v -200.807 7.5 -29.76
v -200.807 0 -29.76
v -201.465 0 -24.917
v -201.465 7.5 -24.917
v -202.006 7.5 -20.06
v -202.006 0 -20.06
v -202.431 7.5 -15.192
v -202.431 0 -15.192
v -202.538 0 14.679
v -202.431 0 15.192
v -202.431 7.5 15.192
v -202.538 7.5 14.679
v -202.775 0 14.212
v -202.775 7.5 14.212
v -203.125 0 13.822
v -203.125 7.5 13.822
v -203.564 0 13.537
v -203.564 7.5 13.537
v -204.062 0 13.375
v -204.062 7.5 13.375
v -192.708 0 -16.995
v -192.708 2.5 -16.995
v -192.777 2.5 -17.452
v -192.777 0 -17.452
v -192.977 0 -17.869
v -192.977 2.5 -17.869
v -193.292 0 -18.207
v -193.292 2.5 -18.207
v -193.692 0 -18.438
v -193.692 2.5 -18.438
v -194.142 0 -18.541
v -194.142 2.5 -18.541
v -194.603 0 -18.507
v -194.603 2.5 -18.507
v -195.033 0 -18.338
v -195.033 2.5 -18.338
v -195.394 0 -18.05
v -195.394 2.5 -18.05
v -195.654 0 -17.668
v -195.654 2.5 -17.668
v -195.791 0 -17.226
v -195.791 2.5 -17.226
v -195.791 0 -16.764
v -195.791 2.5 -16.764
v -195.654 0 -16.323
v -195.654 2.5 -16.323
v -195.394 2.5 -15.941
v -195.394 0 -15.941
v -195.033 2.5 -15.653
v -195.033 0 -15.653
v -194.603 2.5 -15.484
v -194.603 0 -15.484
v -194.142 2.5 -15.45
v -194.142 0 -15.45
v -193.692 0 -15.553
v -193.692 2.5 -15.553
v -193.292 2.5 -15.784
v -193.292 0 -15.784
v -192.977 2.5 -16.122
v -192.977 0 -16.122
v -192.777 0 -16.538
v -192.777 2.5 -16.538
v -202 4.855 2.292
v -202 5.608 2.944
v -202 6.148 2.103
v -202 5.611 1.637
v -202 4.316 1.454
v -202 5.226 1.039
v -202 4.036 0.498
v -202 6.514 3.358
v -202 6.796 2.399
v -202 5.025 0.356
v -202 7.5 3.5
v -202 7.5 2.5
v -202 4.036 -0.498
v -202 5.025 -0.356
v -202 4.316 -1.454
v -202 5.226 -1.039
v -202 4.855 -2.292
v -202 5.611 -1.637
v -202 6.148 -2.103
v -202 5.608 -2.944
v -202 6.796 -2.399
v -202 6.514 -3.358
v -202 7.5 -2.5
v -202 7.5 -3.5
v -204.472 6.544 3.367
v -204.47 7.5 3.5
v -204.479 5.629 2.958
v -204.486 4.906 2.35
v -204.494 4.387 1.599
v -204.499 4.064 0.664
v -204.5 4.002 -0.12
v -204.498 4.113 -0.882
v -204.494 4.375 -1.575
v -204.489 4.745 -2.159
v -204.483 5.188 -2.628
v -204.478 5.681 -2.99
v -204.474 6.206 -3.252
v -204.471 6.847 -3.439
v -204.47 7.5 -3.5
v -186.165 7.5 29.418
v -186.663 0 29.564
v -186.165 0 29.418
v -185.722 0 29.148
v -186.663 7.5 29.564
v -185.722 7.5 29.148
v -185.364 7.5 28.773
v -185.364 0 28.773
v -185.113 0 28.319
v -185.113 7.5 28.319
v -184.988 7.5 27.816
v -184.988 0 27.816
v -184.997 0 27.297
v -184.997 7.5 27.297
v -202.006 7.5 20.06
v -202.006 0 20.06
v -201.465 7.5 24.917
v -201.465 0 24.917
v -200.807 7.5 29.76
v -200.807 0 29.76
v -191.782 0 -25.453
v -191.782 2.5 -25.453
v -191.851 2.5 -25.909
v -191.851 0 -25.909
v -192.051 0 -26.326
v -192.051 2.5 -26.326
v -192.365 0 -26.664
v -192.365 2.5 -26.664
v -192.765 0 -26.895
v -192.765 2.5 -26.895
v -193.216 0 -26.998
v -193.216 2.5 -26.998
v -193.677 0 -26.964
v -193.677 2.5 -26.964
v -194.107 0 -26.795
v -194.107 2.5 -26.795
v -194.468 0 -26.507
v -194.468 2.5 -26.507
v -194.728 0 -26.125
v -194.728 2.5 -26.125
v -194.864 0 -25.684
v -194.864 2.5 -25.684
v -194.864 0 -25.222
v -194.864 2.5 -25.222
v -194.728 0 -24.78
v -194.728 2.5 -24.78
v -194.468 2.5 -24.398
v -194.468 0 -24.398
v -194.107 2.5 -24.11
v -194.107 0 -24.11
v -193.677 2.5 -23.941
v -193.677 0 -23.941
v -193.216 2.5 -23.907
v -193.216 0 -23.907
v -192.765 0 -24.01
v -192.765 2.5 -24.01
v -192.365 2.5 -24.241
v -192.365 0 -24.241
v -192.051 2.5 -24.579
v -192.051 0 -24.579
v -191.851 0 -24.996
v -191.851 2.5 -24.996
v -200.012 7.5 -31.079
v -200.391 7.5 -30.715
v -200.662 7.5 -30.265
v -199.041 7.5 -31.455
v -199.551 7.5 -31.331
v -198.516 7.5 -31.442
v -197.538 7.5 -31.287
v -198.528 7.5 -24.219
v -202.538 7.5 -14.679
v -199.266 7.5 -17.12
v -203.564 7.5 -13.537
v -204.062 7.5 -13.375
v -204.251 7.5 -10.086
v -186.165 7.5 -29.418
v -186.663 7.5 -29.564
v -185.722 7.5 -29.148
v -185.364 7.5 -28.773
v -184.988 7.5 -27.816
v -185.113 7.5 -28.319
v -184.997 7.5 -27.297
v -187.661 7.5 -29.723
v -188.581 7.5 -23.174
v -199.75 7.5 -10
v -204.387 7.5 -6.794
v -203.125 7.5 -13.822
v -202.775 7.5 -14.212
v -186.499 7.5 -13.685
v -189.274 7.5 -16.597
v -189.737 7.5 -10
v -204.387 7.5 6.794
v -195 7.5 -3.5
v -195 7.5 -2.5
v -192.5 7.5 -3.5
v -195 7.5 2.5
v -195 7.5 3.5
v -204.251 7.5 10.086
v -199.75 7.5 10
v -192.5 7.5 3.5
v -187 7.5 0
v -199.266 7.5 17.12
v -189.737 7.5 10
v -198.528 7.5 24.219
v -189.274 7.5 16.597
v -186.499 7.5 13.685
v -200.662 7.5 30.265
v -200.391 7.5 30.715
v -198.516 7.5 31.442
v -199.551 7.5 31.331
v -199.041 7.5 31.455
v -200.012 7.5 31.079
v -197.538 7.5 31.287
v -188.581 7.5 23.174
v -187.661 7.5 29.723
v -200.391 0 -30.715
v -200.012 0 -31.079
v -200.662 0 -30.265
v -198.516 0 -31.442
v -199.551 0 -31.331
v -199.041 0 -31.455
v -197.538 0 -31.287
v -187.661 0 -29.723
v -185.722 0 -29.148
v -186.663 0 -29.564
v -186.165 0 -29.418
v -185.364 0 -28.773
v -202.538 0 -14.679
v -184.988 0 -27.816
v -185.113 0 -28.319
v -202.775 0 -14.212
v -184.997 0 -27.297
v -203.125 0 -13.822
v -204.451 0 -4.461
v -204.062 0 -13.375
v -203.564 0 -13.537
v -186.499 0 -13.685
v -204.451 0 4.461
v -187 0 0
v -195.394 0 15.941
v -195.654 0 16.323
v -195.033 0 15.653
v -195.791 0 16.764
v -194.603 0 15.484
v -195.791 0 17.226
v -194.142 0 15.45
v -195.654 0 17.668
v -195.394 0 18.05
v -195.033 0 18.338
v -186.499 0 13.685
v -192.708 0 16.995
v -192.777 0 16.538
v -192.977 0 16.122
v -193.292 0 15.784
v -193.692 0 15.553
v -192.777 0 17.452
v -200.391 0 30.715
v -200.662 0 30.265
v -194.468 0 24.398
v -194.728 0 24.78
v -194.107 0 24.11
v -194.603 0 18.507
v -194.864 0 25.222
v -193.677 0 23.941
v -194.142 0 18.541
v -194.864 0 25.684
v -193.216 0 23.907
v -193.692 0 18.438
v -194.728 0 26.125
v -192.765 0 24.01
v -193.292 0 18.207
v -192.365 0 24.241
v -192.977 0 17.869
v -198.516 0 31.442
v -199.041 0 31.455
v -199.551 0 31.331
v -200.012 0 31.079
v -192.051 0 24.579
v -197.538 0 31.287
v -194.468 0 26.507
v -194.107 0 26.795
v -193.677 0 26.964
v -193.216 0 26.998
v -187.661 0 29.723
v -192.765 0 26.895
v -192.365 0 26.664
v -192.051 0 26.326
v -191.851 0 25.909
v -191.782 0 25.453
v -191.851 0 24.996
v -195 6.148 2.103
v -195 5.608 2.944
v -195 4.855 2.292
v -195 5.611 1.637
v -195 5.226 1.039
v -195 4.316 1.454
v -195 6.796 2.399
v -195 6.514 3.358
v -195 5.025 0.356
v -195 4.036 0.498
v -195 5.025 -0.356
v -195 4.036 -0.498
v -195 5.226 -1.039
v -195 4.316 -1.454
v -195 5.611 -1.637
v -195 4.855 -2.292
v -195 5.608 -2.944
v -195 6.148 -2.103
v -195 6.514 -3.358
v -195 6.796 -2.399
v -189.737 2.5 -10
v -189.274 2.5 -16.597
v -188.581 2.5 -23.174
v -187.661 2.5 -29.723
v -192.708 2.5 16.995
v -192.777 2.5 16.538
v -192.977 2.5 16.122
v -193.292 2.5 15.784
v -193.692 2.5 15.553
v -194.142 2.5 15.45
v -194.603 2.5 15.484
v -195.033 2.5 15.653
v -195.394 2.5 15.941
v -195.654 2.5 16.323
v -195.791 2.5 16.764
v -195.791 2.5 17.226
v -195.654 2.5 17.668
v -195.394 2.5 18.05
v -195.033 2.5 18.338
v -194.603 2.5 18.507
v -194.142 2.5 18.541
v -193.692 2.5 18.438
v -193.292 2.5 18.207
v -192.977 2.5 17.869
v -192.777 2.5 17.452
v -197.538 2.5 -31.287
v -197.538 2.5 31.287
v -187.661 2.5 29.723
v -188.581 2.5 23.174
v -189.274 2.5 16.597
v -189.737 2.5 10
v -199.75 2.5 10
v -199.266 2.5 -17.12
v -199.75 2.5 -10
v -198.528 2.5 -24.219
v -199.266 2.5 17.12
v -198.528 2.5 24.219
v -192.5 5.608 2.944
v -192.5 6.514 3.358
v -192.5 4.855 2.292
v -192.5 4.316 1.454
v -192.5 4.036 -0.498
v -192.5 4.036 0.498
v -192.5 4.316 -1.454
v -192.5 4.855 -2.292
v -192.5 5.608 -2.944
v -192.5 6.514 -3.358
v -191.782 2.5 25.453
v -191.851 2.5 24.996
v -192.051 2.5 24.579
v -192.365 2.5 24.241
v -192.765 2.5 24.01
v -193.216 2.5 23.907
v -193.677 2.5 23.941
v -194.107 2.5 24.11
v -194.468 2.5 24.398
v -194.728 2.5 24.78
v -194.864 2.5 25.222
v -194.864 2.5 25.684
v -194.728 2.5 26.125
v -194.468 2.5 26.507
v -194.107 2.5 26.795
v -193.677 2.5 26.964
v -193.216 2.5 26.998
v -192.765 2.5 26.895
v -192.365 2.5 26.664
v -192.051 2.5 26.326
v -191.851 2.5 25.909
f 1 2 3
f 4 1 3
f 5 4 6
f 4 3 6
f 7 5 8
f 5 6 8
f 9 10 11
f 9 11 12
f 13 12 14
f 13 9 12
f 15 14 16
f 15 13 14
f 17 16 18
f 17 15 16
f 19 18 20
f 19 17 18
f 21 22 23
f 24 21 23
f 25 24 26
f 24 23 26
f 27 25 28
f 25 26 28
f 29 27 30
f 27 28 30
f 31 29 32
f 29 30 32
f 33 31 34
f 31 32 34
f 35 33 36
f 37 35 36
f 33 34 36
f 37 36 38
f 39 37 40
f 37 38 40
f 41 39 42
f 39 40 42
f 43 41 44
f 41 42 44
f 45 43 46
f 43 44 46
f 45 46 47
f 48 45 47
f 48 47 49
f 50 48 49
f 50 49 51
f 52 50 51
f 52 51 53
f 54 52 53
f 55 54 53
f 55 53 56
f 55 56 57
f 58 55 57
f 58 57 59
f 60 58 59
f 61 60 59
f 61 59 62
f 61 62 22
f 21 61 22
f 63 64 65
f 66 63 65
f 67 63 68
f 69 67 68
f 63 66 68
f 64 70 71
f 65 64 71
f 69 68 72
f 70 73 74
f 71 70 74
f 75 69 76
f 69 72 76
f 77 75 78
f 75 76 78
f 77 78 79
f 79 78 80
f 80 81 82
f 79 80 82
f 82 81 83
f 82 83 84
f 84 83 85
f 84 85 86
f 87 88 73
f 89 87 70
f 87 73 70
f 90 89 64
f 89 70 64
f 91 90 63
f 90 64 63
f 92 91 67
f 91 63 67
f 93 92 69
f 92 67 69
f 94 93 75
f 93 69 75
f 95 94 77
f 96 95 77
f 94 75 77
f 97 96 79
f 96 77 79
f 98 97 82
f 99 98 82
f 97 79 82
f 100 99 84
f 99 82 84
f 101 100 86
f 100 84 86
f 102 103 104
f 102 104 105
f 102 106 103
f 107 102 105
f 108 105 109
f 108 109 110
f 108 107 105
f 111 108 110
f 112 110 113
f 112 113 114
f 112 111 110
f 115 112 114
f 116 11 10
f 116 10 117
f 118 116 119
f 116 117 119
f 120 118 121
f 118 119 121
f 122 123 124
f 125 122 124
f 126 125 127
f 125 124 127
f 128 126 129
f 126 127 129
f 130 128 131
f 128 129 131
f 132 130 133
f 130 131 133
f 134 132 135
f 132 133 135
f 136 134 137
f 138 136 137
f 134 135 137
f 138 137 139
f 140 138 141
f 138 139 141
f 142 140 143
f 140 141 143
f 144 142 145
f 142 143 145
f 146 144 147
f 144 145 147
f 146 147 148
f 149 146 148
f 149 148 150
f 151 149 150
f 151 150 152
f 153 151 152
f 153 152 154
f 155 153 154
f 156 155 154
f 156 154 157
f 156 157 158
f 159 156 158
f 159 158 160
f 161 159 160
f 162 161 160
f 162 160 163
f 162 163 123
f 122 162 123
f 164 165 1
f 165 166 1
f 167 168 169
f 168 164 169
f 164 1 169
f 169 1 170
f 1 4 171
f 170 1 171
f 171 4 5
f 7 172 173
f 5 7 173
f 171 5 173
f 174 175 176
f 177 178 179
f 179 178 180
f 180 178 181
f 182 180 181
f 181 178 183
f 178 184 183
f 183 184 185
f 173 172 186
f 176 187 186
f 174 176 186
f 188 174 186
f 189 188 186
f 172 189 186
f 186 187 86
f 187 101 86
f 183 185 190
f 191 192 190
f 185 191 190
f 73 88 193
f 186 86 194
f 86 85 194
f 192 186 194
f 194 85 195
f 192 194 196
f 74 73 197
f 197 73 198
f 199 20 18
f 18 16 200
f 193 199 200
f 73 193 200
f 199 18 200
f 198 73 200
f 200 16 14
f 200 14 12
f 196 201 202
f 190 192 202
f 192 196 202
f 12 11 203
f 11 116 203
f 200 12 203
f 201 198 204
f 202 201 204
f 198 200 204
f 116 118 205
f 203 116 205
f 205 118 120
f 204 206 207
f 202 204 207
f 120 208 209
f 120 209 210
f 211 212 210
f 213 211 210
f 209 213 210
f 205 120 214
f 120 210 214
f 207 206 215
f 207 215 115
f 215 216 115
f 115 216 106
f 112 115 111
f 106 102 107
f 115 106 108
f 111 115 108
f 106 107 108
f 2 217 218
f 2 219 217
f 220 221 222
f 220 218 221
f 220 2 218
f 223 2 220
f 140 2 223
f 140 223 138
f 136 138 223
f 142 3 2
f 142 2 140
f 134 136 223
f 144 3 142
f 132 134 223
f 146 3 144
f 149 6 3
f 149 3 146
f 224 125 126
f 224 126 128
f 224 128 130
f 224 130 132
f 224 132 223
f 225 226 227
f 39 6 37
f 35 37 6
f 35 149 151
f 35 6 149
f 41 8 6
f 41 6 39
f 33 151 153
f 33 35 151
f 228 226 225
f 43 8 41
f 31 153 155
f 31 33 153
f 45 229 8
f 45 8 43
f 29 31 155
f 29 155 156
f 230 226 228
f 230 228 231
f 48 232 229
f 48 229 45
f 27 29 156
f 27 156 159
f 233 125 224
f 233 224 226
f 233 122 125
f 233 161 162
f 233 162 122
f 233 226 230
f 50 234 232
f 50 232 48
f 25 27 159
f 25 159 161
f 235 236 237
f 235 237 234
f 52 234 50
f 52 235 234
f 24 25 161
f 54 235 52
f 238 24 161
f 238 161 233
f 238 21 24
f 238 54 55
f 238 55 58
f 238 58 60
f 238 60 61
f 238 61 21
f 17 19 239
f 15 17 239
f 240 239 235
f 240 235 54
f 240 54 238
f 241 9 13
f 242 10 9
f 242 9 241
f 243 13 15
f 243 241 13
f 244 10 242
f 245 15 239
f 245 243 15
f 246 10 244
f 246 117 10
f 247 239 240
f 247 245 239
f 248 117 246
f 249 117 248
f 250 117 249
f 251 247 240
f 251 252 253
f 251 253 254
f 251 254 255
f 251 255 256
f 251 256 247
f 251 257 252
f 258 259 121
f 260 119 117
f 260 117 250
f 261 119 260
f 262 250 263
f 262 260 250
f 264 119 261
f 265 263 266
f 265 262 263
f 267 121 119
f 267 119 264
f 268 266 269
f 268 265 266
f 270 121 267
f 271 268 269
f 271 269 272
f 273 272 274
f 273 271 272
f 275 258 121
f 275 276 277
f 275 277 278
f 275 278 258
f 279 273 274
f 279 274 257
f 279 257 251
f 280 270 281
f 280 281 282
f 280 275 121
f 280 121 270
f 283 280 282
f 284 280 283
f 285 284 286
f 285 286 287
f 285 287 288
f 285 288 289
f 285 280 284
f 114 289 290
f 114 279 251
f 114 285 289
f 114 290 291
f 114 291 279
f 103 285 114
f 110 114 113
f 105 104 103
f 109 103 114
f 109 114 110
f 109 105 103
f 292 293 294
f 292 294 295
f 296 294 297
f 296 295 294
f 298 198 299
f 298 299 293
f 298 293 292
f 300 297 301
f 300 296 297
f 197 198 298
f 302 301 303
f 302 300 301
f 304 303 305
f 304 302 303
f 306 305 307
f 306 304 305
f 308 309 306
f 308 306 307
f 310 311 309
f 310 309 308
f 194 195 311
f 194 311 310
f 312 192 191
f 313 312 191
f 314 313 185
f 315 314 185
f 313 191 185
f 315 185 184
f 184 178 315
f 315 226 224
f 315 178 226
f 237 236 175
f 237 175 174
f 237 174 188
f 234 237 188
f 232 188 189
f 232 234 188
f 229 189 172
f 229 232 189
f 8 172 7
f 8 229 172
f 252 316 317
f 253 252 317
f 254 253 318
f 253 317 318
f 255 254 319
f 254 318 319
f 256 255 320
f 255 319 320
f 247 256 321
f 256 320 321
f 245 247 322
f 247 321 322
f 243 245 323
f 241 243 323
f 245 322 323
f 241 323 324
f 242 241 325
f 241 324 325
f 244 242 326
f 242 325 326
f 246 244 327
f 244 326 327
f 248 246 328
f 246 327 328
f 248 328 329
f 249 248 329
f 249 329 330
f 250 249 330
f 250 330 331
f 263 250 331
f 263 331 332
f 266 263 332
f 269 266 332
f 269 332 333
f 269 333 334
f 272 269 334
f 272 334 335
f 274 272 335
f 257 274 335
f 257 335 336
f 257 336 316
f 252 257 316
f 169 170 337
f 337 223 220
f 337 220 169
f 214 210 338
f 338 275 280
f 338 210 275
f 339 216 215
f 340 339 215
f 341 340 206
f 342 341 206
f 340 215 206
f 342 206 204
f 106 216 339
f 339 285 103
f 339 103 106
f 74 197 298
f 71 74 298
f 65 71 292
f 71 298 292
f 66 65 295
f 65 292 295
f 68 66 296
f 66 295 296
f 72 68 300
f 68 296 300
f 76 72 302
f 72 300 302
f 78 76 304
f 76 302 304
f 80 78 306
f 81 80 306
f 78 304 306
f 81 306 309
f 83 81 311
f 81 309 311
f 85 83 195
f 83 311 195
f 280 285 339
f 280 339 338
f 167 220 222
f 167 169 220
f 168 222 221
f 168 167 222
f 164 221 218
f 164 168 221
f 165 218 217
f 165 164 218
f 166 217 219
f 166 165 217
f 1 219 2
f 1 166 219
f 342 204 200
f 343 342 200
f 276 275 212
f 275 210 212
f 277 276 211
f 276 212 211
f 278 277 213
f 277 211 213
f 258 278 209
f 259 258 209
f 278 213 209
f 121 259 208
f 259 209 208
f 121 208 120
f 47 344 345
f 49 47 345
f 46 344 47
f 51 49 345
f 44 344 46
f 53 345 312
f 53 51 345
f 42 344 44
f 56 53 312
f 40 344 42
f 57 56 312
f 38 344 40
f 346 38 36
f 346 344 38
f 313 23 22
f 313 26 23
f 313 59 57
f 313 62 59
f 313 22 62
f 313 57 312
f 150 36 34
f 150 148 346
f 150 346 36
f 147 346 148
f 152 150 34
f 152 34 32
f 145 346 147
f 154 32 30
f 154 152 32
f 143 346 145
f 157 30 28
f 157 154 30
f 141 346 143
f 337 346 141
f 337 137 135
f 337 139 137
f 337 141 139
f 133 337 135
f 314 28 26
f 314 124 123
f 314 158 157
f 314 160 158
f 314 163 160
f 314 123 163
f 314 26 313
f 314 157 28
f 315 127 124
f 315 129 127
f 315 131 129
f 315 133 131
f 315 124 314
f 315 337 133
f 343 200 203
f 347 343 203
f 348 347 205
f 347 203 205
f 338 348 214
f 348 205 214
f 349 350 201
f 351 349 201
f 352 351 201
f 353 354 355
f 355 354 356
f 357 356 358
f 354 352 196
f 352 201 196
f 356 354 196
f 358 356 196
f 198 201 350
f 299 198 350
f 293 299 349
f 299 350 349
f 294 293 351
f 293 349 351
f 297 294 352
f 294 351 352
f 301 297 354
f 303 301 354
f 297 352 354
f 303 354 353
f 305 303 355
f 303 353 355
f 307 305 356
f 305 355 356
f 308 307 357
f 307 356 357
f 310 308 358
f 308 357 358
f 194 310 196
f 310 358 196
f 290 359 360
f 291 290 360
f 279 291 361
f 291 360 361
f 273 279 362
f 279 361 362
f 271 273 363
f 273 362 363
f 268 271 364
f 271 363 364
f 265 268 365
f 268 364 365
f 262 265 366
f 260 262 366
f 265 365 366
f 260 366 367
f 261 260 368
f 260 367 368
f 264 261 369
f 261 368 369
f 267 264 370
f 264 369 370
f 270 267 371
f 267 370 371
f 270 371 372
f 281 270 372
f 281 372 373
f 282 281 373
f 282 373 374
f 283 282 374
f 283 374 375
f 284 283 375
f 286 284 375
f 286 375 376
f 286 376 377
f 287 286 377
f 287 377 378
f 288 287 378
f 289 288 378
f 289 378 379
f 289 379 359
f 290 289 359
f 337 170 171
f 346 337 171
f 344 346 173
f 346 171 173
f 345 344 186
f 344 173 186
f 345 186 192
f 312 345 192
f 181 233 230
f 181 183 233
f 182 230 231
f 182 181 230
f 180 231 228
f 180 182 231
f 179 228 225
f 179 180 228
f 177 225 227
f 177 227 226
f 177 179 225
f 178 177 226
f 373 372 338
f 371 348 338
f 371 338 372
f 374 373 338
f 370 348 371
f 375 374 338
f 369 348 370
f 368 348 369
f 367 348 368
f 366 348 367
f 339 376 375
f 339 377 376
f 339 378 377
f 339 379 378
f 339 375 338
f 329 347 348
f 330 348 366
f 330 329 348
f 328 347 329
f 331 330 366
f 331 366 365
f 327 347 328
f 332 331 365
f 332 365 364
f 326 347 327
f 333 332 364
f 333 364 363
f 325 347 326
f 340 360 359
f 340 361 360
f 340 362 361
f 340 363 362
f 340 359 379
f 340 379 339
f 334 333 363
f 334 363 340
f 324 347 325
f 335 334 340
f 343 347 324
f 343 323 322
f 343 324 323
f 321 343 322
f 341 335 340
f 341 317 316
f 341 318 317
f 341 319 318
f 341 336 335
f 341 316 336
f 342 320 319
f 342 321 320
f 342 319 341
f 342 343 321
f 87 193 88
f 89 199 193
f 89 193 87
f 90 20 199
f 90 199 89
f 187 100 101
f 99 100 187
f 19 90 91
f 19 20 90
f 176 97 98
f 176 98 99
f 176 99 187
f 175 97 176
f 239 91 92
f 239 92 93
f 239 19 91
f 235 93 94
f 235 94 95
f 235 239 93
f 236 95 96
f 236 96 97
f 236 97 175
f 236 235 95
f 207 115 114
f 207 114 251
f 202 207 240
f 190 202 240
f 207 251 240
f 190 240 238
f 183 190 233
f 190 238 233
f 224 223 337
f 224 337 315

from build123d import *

# Parameters (mm, degrees)
BOSS_EXTRUDE1_DEPTH        = 7.5
BOSS_EXTRUDE2_DEPTH        = 7.5
CUT_EXTRUDE1_DEPTH         = 5
F_3_1_3_1_DIAMETER_HOLE2_D = 3.1
SKETCH21_R                 = 3.5
CUT_EXTRUDE2_DEPTH         = 2.5
CUT_EXTRUDE3_START         = 2.5
SKETCH23_R                 = 3.5
CUT_EXTRUDE3_DEPTH         = 2.5
SKETCH22_R                 = 2.5
CUT_EXTRUDE4_DEPTH         = 35.217583069
FILLET1_R                  = 2
FILLET2_R                  = 2


with BuildPart() as part:
    # Sketch1 → Boss-Extrude1 (new body)
    with BuildSketch(Plane(origin=(0, 0, 0), x_dir=(1, 0, 0), z_dir=(0, 1, 0))):
        with BuildLine():
            ThreePointArc((-187.660784713, 29.722548358), (-190, 0), (-187.660784713, -29.722548358))
            Line((-187.660784713, -29.722548358), (-197.537668119, -31.286893008))
            ThreePointArc((-197.537668119, -31.286893008), (-200, 0), (-197.537668119, 31.286893008))
            Line((-197.537668119, 31.286893008), (-187.660784713, 29.722548358))
        make_face()
        with BuildLine():
            ThreePointArc((-197.537668119, -31.286893008), (-200, 0), (-197.537668119, 31.286893008))
            Line((-197.537668119, 31.286893008), (-200.500733141, 31.756196403))
            ThreePointArc((-200.500733141, 31.756196403), (-203, 0), (-200.500733141, -31.756196403))
            Line((-200.500733141, -31.756196403), (-197.537668119, -31.286893008))
        make_face()
        with BuildLine():
            Line((-184.697719691, 29.253244963), (-187.660784713, 29.722548358))
            ThreePointArc((-187.660784713, 29.722548358), (-190, 0), (-187.660784713, -29.722548358))
            Line((-187.660784713, -29.722548358), (-184.697719691, -29.253244963))
            ThreePointArc((-184.697719691, -29.253244963), (-187, 0), (-184.697719691, 29.253244963))
        make_face()
    extrude(amount=BOSS_EXTRUDE1_DEPTH)

    # Sketch19 → Boss-Extrude2 (add)
    with BuildSketch(Plane(origin=(0, 0, 0), x_dir=(1, 0, 0), z_dir=(0, 1, 0))):
        with BuildLine():
            Line((-204.062149802, 13.374939928), (-202.565361417, 13.276835234))
            ThreePointArc((-202.565361417, 13.276835234), (-203, 0), (-202.565361417, -13.276835234))
            Line((-202.565361417, -13.276835234), (-204.062149802, -13.374939928))
            ThreePointArc((-204.062149802, -13.374939928), (-204.5, 0), (-204.062149802, 13.374939928))
        make_face()
    extrude(amount=BOSS_EXTRUDE2_DEPTH)

    # Sketch15 → Cut-Extrude1 (cut)
    with BuildSketch(Plane(origin=(0, 7.5, 0), x_dir=(1, 0, 0), z_dir=(0, 1, 0))):
        with BuildLine():
            Line((-199.749843554, 10), (-189.73665961, 10))
            ThreePointArc((-189.73665961, 10), (-188.956218405, 19.88837666), (-187.660784713, 29.722548358))
            Line((-187.660784713, 29.722548358), (-197.537668119, 31.286893008))
            ThreePointArc((-197.537668119, 31.286893008), (-198.928692466, 20.673057674), (-199.749843554, 10))
        make_face()
        with BuildLine():
            ThreePointArc((-187.660784713, -29.722548358), (-188.956218405, -19.88837666), (-189.73665961, -10))
            Line((-189.73665961, -10), (-199.749843554, -10))
            ThreePointArc((-199.749843554, -10), (-198.928692466, -20.673057674), (-197.537668119, -31.286893008))
            Line((-197.537668119, -31.286893008), (-187.660784713, -29.722548358))
        make_face()
    extrude(amount=-CUT_EXTRUDE1_DEPTH, mode=Mode.SUBTRACT)

    # Ø3.1 (3.1) Diameter Hole2 (through all)
    with Locations(Plane(origin=(0, 0, 0), x_dir=(-1, 0, 0), z_dir=(0, -1, 0))):
        with Locations((193.331747968, -25.452607483), (194.257966128, -16.995369836), (194.257966128, 16.995369836), (193.331747968, 25.452607483)):
            Hole(F_3_1_3_1_DIAMETER_HOLE2_D / 2)

    # Sketch21 → Cut-Extrude2 (cut)
    with BuildSketch(Plane(origin=(-192.5, 0, 0), x_dir=(0, 0, -1), z_dir=(1, 0, 0))):
        with Locations((0, 7.5)):
            Circle(SKETCH21_R)
    extrude(amount=-CUT_EXTRUDE2_DEPTH, mode=Mode.SUBTRACT)

    # Sketch23 → Cut-Extrude3 (cut)
    with BuildSketch(Plane(origin=(-204.5, 0, 0), x_dir=(0, 0, -1), z_dir=(1, 0, 0)).offset(CUT_EXTRUDE3_START)):
        with Locations((0, 7.5)):
            Circle(SKETCH23_R)
    extrude(amount=-CUT_EXTRUDE3_DEPTH, mode=Mode.SUBTRACT)

    # Sketch22 → Cut-Extrude4 (cut, through all)
    with BuildSketch(Plane(origin=(-195, 0, 0), x_dir=(0, 0, -1), z_dir=(1, 0, 0))):
        with Locations((0, 7.5)):
            Circle(SKETCH22_R)
    extrude(amount=-CUT_EXTRUDE4_DEPTH, mode=Mode.SUBTRACT)

    # Fillet1
    fillet1_edges = [part.edges().sort_by_distance(p)[0] for p in [
        (-200.500733141, 3.75, 31.756196403),
        (-200.500733141, 3.75, -31.756196403),
        (-184.697719691, 3.75, -29.253244963),
        (-184.697719691, 3.75, 29.253244963),
    ]]
    fillet(fillet1_edges, radius=FILLET1_R)

    # Fillet2
    # the kernel refuses this fillet: 2 mm, written as the material it adds along each edge
    with BuildSketch(Plane(origin=(-202.565361417, 0, -13.276835234), x_dir=(0.0701211938680431, 0, -0.9975384795437819), z_dir=(0, 1, 0))) as fillet2_piece_1:
        with BuildLine():
            CenterArc((1.929399735, 1.999977637), FILLET2_R, 194.477346772, 75.251705008)
            Line((-0.007093381, 1.499983228), (-0.045823244, 1.48998334))
            ThreePointArc((-0.045823244, 1.48998334), (-0.043546243, 0.749802457), (-0.039999553, -0.000189157))
            Line((-0.039999553, -0.000189157), (0.000189157, -0.039999553))
            ThreePointArc((0.000189157, -0.039999553), (0.959970947, -0.037730174), (1.919752737, -0.039999553))
            Line((1.919752737, -0.039999553), (1.919941893, 0))
        make_face()
    extrude(amount=7.5)
    with BuildSketch(Plane(origin=(-202.565361417, 0, 13.276835234), x_dir=(-0.9978589232386035, 0, 0.06540312923014294), z_dir=(0, 1, 0))) as fillet2_piece_2:
        with BuildLine():
            CenterArc((1.990831296, 1.938835898), FILLET2_R, 180.54189644, 75.251705008)
            Line((-0.009079253, 1.919920426), (-0.049077464, 1.919542116))
            ThreePointArc((-0.049077464, 1.919542116), (-0.042269379, 0.95978179), (-0.04, 0))
            Line((-0.04, 0), (0, -0.04))
            ThreePointArc((0, -0.04), (0.75, -0.04), (1.490183374, -0.038776718))
            Line((1.490183374, -0.038776718), (1.5, 0))
        make_face()
    extrude(amount=7.5)


solid = part.part
